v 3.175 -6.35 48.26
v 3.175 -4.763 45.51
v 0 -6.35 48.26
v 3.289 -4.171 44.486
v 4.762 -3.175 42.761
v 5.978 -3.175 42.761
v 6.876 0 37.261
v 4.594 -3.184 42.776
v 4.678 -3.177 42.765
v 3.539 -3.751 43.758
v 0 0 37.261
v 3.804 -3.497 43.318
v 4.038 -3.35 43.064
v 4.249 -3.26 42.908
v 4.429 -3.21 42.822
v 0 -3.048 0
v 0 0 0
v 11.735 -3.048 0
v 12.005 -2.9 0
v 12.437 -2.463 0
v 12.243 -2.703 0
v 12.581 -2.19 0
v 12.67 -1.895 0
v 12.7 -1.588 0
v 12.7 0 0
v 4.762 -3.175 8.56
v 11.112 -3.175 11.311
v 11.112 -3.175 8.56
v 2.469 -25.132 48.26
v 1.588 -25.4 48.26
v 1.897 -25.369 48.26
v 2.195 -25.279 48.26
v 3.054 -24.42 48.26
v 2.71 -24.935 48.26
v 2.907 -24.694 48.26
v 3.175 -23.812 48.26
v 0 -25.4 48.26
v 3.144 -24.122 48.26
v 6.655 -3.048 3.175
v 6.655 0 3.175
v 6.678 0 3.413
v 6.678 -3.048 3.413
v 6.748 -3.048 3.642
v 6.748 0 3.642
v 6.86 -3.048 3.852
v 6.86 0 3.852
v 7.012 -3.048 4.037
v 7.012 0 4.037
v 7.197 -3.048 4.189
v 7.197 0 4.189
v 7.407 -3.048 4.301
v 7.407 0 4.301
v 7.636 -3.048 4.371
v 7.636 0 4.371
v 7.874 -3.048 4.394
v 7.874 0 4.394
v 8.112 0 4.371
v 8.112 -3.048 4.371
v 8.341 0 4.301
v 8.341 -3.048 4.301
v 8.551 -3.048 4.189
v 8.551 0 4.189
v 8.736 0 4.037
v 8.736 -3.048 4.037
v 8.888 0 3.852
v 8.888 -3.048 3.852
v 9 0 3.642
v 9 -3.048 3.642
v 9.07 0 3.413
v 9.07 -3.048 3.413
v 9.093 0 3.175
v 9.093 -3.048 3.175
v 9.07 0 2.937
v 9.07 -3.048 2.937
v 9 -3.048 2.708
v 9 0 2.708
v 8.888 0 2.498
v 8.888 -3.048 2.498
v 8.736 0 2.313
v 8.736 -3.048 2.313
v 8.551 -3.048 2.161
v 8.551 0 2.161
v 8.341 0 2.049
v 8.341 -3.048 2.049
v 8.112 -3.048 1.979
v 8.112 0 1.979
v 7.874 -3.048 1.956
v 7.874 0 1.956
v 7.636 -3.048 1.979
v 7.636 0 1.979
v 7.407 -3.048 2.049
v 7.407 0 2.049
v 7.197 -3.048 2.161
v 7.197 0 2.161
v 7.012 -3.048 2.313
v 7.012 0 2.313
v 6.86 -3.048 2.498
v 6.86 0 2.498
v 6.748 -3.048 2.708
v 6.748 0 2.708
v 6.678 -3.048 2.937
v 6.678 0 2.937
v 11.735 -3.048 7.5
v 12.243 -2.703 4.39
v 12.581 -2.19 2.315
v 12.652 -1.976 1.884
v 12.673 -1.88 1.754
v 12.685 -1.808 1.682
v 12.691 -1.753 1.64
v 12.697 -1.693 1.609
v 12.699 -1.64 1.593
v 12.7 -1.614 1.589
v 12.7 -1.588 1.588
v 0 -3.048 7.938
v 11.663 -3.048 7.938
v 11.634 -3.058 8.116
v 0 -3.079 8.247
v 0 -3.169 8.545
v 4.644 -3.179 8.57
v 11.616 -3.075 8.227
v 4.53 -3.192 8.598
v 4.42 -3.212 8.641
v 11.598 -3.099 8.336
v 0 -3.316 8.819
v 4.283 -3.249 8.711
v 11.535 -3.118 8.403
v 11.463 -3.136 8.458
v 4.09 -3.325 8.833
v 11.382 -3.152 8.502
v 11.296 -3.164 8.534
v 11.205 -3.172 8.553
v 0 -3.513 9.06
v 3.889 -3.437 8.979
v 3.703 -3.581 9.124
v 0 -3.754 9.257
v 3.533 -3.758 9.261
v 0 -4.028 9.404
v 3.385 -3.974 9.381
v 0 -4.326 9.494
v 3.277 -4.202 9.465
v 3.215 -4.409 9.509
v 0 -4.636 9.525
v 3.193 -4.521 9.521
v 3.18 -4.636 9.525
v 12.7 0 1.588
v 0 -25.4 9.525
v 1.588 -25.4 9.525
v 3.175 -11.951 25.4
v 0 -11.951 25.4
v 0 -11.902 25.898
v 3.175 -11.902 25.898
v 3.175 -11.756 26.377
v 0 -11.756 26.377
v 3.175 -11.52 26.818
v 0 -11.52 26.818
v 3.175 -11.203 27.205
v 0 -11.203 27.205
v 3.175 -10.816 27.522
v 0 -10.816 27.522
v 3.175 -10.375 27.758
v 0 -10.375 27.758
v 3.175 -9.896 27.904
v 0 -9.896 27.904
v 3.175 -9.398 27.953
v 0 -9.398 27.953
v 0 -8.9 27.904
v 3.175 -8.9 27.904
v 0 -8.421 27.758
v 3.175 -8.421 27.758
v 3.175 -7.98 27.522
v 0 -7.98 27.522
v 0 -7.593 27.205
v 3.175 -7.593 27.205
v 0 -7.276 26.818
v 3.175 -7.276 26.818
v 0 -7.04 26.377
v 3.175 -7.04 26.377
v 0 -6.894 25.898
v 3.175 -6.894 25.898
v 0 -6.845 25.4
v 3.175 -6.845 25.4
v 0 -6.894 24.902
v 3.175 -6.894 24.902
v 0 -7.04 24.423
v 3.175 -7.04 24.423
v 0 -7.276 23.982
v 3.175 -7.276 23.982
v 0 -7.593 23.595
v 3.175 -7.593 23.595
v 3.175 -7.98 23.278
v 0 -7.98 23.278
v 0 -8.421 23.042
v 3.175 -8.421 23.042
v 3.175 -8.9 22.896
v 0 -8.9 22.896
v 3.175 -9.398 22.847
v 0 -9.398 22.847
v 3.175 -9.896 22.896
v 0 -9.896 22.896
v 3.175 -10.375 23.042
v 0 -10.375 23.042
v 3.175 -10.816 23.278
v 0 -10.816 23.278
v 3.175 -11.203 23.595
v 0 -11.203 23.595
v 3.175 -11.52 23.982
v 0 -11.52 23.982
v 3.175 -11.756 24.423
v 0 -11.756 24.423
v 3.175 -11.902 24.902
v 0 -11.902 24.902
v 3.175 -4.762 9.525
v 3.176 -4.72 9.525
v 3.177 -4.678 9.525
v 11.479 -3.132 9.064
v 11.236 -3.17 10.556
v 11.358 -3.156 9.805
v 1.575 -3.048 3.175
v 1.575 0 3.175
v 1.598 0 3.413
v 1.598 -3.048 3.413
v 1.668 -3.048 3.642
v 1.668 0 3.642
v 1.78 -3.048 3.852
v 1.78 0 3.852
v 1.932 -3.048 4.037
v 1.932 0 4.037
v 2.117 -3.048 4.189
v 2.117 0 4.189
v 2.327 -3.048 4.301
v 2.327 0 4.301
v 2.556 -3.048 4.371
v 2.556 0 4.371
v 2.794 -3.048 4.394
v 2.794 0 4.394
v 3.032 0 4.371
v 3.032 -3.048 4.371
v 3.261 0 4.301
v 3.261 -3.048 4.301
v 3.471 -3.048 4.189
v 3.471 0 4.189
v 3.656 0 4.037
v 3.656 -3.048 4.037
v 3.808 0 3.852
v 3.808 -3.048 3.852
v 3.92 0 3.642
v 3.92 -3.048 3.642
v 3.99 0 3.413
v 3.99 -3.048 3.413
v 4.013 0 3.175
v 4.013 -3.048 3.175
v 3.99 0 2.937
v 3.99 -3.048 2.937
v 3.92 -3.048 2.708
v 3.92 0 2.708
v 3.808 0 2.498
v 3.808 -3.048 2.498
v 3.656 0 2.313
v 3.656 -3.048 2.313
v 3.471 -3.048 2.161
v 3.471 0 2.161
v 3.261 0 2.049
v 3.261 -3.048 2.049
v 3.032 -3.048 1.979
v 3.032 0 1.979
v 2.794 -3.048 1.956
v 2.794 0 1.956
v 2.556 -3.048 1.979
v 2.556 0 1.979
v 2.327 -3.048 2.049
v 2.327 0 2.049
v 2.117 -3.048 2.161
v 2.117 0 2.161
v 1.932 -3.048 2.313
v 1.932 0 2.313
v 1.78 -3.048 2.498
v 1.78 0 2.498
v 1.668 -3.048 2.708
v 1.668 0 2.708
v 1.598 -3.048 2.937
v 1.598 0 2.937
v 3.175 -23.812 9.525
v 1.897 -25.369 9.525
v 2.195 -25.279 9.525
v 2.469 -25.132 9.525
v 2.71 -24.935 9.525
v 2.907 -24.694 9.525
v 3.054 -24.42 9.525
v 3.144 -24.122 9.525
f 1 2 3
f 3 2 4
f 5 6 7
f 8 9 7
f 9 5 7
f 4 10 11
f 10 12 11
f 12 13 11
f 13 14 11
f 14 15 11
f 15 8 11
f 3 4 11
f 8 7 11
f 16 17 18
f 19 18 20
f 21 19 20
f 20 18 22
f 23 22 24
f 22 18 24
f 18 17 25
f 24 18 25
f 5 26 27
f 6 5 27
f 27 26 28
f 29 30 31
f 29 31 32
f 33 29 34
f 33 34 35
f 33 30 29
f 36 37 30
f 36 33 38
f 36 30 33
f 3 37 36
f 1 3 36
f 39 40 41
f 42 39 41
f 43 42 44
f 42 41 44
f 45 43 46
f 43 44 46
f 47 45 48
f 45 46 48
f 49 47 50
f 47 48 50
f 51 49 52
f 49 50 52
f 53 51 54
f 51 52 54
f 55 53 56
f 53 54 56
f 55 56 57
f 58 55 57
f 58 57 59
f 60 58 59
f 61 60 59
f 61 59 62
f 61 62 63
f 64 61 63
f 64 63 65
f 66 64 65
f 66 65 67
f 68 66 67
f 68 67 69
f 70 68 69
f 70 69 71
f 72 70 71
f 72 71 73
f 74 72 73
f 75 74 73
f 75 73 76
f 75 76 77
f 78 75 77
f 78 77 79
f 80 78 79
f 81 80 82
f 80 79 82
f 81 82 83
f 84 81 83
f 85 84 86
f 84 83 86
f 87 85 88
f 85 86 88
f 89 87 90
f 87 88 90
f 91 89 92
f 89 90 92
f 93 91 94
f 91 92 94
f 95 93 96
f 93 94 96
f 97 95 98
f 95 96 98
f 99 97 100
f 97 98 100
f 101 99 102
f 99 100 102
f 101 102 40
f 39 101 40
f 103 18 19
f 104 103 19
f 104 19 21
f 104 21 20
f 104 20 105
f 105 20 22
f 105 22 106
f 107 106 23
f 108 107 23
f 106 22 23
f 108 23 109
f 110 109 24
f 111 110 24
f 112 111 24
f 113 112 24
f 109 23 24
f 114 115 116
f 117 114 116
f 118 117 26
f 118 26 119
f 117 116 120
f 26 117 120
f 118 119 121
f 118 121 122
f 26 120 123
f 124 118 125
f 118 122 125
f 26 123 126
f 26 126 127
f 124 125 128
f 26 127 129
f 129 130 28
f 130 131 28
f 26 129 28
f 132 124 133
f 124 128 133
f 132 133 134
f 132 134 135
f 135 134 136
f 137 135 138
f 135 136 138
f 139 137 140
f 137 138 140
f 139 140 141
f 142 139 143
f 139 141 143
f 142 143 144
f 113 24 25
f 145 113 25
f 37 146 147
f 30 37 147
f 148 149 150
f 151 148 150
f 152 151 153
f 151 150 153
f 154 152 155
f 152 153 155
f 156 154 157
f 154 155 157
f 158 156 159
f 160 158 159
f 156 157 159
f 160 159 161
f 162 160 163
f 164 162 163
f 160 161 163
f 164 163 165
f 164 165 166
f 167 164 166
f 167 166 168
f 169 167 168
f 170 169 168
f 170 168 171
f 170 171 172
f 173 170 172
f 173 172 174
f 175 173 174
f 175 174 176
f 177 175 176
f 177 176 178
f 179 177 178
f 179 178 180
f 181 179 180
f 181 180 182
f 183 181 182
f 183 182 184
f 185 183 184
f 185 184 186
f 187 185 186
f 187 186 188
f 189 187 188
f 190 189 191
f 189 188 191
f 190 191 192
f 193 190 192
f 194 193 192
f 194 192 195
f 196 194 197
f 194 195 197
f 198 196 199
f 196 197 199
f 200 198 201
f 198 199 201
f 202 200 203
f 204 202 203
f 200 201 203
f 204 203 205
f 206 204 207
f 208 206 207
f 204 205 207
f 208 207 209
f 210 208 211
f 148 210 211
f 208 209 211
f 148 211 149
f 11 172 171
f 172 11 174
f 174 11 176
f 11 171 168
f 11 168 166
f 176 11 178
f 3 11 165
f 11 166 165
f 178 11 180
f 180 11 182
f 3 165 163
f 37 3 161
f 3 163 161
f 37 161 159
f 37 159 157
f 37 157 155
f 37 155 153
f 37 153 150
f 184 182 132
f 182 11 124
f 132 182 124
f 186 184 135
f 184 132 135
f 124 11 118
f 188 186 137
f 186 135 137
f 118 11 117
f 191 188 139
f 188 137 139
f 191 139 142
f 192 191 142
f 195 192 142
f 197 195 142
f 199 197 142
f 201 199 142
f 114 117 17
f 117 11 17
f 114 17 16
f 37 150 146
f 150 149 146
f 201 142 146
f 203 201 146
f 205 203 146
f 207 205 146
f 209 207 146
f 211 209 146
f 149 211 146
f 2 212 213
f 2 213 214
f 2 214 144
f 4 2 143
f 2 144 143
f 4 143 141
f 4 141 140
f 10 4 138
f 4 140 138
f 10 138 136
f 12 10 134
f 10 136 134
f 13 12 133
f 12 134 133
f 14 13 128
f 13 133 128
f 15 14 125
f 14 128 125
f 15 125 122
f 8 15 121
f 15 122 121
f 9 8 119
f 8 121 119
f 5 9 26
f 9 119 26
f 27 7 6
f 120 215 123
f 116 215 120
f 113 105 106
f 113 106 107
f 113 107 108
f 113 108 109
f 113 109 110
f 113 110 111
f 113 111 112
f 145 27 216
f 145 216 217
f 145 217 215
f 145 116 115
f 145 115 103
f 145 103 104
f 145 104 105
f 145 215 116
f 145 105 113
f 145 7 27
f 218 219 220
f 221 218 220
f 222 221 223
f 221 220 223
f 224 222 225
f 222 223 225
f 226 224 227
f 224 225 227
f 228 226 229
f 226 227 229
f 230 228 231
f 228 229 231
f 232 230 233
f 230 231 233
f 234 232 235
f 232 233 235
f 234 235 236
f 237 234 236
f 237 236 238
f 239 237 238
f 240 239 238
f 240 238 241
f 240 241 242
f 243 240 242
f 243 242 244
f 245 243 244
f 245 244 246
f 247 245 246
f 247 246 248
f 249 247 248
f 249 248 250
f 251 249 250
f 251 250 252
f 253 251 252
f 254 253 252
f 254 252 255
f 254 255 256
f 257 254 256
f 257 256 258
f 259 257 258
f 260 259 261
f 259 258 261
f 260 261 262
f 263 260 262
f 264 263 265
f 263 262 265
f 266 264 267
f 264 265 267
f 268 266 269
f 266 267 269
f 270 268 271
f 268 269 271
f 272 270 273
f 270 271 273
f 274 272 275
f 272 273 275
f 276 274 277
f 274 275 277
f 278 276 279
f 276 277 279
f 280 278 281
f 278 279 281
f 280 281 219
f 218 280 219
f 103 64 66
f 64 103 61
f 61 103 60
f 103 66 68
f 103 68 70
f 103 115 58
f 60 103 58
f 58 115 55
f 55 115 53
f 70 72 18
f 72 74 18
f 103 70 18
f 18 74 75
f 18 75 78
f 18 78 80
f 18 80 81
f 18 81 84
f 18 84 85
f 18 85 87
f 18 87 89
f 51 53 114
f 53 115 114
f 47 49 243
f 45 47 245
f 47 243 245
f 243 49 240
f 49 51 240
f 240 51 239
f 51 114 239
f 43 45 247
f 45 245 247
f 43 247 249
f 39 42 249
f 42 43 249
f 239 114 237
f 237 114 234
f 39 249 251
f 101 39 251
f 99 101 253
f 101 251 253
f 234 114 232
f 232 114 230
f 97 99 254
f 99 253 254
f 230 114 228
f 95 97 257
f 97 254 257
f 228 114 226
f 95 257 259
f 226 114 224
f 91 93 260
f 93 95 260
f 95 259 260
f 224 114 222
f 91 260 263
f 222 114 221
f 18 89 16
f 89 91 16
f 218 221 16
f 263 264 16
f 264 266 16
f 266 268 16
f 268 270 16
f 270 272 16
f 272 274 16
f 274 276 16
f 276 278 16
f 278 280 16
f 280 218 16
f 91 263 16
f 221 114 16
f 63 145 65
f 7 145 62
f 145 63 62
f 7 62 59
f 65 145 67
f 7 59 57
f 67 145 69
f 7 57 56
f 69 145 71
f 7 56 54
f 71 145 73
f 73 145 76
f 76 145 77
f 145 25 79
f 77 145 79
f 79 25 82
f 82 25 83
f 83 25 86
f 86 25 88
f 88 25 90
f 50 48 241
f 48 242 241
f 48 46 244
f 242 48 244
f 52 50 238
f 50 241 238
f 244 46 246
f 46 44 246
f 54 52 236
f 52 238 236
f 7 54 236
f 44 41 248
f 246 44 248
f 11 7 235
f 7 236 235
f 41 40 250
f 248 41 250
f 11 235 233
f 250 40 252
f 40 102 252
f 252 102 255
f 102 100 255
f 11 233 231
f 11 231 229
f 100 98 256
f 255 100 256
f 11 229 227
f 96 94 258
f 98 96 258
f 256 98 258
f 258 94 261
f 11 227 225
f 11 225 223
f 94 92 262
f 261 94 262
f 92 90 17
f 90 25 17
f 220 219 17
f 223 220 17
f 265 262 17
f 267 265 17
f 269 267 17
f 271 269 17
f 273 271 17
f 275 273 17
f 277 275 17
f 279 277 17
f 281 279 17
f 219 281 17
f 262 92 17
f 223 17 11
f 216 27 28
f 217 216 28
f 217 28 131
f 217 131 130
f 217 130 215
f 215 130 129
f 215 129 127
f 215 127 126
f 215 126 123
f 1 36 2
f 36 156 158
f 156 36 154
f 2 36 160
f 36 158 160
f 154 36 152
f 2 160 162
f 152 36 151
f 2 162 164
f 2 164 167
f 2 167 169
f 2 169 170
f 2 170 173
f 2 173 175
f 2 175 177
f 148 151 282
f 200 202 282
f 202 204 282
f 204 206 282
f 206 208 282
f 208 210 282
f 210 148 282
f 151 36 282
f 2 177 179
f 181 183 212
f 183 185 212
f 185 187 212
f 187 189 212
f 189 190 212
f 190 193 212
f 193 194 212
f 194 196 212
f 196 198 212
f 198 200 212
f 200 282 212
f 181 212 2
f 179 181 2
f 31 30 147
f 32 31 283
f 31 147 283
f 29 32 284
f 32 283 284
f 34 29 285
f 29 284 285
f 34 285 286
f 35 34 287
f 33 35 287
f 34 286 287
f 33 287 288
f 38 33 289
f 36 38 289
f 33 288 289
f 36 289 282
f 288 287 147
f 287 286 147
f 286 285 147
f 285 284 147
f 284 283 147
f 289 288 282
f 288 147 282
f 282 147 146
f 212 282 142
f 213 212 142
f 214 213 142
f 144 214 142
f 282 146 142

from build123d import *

# Parameters (mm, degrees)
BOSS_EXTRUDE1_DEPTH = 48.26
SKETCH2_W           = 9.525
SKETCH2_H           = 22.352
CUT_EXTRUDE1_DEPTH  = 56.99533552
SKETCH3_R           = 1.2192
CUT_EXTRUDE2_DEPTH  = 56.99533552
FILLET2_R           = 1.5875
SKETCH4_R           = 2.5527
CUT_EXTRUDE3_DEPTH  = 56.995335629
CUT_EXTRUDE4_DEPTH  = 56.995335629
CHAMFER2_SIZE       = 6.35
CHAMFER2_SIZE2      = 10.998522628


with BuildPart() as part:
    # Sketch1 → Boss-Extrude1 (new body)
    with BuildSketch(Plane.XY):
        with BuildLine():
            Line((0, 0), (0, -25.4))
            Line((0, -25.4), (1.5875, -25.4))
            ThreePointArc((1.5875, -25.4), (2.710032015, -24.935032015), (3.175, -23.8125))
            Line((3.175, -23.8125), (3.175, -4.7625))
            ThreePointArc((3.175, -4.7625), (3.639967985, -3.639967985), (4.7625, -3.175))
            Line((4.7625, -3.175), (11.1125, -3.175))
            ThreePointArc((11.1125, -3.175), (12.235032015, -2.710032015), (12.7, -1.5875))
            Line((12.7, -1.5875), (12.7, 0))
            Line((12.7, 0), (0, 0))
        make_face()
    extrude(amount=BOSS_EXTRUDE1_DEPTH)

    # Sketch2 → Cut-Extrude1 (cut, through all)
    with BuildSketch(Plane(origin=(0, 0, 0), x_dir=(0, 0, -1), z_dir=(1, 0, 0))):
        with Locations((-4.7625, -14.224)):
            Rectangle(SKETCH2_W, SKETCH2_H)
    extrude(amount=CUT_EXTRUDE1_DEPTH, mode=Mode.SUBTRACT)

    # Sketch3 → Cut-Extrude2 (cut, through all)
    with BuildSketch(Plane(origin=(0, 0, 0), x_dir=(1, 0, 0), z_dir=(0, 1, 0))):
        with Locations(Location((2.794, -3.175, 0), (0, 0, 180))):
            Circle(SKETCH3_R)
        with Locations(Location((7.874, -3.175, 0), (0, 0, 180))):
            Circle(SKETCH3_R)
    extrude(amount=-CUT_EXTRUDE2_DEPTH, mode=Mode.SUBTRACT)

    # Fillet2
    fillet2_edges = [part.edges().sort_by_distance(p)[0] for p in [
        (5.867335197, -3.048, 9.525),
    ]]
    fillet(fillet2_edges, radius=FILLET2_R)

    # Sketch4 → Cut-Extrude3 (cut, through all)
    with BuildSketch(Plane.ZY):
        with Locations(Location((25.4, -9.398, 0), (0, 0, 270))):
            Circle(SKETCH4_R)
    extrude(amount=-CUT_EXTRUDE3_DEPTH, mode=Mode.SUBTRACT)

    # Sketch6 → Cut-Extrude4 (cut, through all)
    with BuildSketch(Plane(origin=(0, 0, 0), x_dir=(1, 0, 0), z_dir=(0, 1, 0))):
        Polygon((5.08, -48.26), (12.7, -1.5875), (12.7, -48.26), align=None)
    extrude(amount=-CUT_EXTRUDE4_DEPTH, mode=Mode.SUBTRACT)

    # Chamfer2
    chamfer2_edges = [part.edges().sort_by_distance(p)[0] for p in [
        (2.54, 0, 48.26),
    ]]
    chamfer2_side = [part.faces().sort_by_distance(p)[0] for p in [
        (1.769133551, -11.790484545, 48.26),
    ]]
    chamfer(chamfer2_edges, length=CHAMFER2_SIZE, length2=CHAMFER2_SIZE2, reference=chamfer2_side[0])


solid = part.part
